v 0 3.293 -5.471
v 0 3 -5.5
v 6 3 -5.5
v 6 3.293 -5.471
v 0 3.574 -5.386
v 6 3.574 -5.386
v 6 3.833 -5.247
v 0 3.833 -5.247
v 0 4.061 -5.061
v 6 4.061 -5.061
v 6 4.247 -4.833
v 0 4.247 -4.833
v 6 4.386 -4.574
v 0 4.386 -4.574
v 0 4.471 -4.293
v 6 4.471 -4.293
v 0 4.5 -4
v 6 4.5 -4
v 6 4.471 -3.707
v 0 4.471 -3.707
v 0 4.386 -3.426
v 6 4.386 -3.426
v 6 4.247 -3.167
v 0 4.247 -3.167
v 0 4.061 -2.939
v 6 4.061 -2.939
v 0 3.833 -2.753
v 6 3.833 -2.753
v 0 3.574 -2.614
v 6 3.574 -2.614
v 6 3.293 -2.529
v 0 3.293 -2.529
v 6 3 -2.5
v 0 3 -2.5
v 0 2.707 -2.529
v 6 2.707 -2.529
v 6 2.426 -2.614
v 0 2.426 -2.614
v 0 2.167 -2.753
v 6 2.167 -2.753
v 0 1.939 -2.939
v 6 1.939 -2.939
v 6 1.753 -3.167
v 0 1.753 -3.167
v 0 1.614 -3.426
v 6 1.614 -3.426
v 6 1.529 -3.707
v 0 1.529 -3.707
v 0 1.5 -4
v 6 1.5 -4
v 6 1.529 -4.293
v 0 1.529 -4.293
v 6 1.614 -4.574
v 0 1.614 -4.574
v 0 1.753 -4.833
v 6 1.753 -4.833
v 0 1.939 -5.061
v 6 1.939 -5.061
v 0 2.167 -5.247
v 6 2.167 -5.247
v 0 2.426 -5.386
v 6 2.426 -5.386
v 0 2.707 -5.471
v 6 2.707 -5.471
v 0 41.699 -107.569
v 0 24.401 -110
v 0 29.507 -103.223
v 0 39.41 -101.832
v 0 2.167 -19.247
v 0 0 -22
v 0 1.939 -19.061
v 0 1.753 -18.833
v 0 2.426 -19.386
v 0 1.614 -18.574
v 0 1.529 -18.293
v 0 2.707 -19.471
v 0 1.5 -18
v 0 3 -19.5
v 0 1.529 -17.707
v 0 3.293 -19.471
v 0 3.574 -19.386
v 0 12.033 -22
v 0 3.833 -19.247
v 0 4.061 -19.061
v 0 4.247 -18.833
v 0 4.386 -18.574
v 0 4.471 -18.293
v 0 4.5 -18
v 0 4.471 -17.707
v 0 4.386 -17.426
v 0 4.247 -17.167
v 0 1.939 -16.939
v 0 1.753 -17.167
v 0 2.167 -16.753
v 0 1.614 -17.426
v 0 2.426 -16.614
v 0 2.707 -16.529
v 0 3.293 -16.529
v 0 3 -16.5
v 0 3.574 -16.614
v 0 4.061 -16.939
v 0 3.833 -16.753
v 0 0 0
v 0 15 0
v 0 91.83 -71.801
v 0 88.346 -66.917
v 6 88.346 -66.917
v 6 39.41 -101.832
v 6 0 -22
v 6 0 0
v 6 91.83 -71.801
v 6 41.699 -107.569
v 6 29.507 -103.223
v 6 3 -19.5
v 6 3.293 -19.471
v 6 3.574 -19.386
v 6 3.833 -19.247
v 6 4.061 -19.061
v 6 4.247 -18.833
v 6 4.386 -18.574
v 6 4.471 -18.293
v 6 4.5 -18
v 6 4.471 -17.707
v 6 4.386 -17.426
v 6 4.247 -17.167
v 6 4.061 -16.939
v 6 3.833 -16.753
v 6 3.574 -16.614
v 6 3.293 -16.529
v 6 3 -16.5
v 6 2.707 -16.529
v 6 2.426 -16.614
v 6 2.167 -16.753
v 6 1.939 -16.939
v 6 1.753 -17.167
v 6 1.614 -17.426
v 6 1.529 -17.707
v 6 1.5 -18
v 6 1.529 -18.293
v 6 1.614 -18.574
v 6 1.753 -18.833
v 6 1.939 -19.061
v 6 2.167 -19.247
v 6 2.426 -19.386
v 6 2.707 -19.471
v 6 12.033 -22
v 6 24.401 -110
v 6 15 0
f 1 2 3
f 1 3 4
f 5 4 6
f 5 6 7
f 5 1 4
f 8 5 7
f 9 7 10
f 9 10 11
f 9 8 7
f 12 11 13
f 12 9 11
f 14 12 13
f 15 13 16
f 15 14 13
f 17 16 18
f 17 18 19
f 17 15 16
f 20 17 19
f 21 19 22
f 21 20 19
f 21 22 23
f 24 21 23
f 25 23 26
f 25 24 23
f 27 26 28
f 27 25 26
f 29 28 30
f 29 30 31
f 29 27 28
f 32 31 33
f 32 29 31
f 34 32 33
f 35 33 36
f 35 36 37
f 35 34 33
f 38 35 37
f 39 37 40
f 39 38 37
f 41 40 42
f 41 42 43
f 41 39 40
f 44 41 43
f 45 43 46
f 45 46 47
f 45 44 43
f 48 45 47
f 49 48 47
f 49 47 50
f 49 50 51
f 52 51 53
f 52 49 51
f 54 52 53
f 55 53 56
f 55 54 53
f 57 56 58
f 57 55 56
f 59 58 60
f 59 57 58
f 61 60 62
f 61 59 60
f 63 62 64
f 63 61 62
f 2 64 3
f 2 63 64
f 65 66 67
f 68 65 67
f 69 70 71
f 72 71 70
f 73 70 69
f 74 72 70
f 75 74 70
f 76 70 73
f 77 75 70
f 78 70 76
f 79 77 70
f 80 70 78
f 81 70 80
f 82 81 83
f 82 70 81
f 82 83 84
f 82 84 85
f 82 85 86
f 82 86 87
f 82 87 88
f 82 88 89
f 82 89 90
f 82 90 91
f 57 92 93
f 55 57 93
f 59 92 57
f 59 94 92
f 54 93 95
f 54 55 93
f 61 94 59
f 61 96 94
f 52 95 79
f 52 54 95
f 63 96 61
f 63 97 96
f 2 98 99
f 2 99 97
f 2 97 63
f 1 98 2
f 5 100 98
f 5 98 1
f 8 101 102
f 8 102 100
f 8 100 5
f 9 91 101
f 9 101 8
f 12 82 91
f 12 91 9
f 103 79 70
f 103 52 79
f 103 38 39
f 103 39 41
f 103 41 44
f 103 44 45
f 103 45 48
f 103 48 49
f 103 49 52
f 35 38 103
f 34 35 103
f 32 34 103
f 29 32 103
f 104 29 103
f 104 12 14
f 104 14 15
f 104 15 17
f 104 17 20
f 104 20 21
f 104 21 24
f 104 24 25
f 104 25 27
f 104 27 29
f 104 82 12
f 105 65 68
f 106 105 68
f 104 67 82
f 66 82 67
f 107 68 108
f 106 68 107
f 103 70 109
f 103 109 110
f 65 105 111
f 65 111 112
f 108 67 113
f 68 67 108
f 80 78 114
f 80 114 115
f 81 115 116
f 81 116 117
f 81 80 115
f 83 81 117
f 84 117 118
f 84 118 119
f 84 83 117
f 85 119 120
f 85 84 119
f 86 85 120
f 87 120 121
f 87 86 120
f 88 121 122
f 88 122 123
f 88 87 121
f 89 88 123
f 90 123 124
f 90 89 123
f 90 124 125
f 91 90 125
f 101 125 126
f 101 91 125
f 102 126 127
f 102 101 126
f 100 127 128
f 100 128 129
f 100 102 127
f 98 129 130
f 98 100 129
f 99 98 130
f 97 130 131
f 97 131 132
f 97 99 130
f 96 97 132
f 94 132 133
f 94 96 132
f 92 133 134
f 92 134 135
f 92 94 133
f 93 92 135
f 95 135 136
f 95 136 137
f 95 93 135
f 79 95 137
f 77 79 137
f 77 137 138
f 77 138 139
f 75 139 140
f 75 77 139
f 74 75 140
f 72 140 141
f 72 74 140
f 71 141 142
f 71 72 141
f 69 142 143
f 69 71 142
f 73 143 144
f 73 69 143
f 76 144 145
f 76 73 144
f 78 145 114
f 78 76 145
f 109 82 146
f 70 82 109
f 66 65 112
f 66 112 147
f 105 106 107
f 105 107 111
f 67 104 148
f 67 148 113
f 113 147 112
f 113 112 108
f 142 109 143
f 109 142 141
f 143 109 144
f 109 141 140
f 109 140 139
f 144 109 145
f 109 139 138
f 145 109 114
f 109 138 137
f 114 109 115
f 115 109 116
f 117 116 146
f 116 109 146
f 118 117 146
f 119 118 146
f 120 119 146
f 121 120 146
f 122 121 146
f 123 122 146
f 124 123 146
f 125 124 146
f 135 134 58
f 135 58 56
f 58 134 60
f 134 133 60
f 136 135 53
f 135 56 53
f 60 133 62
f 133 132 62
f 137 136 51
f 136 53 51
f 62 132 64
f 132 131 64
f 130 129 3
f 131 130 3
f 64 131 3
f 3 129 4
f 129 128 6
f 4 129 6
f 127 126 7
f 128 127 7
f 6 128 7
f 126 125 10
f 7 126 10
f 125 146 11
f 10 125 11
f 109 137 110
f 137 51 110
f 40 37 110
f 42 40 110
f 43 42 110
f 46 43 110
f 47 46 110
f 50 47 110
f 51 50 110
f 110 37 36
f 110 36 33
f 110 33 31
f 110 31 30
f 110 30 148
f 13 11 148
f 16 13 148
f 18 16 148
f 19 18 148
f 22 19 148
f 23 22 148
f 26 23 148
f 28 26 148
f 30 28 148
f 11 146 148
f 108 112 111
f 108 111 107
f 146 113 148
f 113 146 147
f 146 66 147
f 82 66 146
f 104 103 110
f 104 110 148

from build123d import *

# Parameters (mm, degrees)
SKETCH1_R           = 1.5
BOSS_EXTRUDE1_DEPTH = 6


with BuildPart() as part:
    # Sketch1 → Boss-Extrude1 (new body)
    with BuildSketch(Plane(origin=(0, 0, 0), x_dir=(0, 0, -1), z_dir=(1, 0, 0))):
        Polygon((0, 0), (0, 15), (103.223352982, 29.507096189), (101.831621972, 39.409776876), (66.916528588, 88.345571837), (71.800771975, 91.830419975), (107.568840624, 41.699124196), (110, 24.400526382), (22, 12.032932928), (22, 0), align=None)
        with Locations((4, 3)):
            Circle(SKETCH1_R, mode=Mode.SUBTRACT)
        with Locations((18, 3)):
            Circle(SKETCH1_R, mode=Mode.SUBTRACT)
    extrude(amount=BOSS_EXTRUDE1_DEPTH)


solid = part.part
